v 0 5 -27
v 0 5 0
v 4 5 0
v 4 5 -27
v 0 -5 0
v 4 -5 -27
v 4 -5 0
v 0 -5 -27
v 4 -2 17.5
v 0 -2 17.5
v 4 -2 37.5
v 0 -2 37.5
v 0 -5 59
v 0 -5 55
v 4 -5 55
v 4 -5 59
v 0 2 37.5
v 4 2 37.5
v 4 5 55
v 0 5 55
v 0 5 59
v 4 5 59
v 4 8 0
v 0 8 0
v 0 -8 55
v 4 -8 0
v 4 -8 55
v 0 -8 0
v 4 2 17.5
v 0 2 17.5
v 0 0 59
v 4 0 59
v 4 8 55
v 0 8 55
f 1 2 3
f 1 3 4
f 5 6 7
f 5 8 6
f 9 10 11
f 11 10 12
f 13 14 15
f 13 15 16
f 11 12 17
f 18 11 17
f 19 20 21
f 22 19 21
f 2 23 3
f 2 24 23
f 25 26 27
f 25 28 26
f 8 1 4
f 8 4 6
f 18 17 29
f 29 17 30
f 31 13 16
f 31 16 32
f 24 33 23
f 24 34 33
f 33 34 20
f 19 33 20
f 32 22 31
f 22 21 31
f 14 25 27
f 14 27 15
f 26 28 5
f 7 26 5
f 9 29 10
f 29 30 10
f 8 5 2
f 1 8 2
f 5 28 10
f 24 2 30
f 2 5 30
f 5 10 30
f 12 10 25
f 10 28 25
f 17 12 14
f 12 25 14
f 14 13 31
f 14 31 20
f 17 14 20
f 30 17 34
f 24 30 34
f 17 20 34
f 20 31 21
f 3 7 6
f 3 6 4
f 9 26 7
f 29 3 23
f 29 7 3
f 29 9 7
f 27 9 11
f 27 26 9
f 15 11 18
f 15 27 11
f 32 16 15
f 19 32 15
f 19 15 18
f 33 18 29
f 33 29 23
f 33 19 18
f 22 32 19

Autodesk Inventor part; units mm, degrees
ref_plane "YZ Plane" through (0, 0, 0) normal (1, 0, 0) x (0, 1, 0)
ref_plane "XZ Plane" through (0, 0, 0) normal (0, 1, 0) x (-1, 0, 0)
ref_plane "XY Plane" through (0, 0, 0) normal (0, 0, 1) x (1, 0, 0)
sketch "Эскиз1" plane through (0, 0, 0) normal (1, 0, 0) x (0, 1, 0)
  line L0 (-8, 55) -> (8, 55) construction
  line L1 (8, 55) -> (8, 0)
  line L2 (8, 0) -> (-8, 0) construction
  line L3 (-8, 0) -> (-8, 55)
  line L4 (8, 0) -> (5, 0)
  line L5 (5, 0) -> (5, -27)
  line L6 (5, -27) -> (-5, -27)
  line L7 (-5, -27) -> (-5, 0)
  line L8 (-8, 0) -> (-5, 0)
  line L9 (0, 59) -> (0, -27) construction
  line L10 (8, 55) -> (5, 55)
  line L11 (5, 55) -> (5, 59)
  line L12 (5, 59) -> (0, 59)
  line L13 (-8, 55) -> (-5, 55)
  line L14 (-5, 55) -> (-5, 59)
  line L15 (-5, 59) -> (0, 59)
  line L16 (-2, 37.5) -> (2, 37.5)
  line L17 (2, 37.5) -> (2, 17.5)
  line L18 (2, 17.5) -> (-2, 17.5)
  line L19 (-2, 17.5) -> (-2, 37.5)
  point P0 (0, 0)
  point P1 (2, 27.5)
  point P2 (8, 27.5)
  point P3 (0, 37.5)
  dimension "d0" = 10
  dimension "d1" = 16
  dimension "d2" = 27
  dimension "d3" = 55
  dimension "d4" = 4
  dimension "d7" = 20
  dimension "d8" = 4
extrude "Выдавливание2" add sketch "Эскиз1" along normal blind 4
properties part number "PistonPart4" material "Дерево (вишня)"
